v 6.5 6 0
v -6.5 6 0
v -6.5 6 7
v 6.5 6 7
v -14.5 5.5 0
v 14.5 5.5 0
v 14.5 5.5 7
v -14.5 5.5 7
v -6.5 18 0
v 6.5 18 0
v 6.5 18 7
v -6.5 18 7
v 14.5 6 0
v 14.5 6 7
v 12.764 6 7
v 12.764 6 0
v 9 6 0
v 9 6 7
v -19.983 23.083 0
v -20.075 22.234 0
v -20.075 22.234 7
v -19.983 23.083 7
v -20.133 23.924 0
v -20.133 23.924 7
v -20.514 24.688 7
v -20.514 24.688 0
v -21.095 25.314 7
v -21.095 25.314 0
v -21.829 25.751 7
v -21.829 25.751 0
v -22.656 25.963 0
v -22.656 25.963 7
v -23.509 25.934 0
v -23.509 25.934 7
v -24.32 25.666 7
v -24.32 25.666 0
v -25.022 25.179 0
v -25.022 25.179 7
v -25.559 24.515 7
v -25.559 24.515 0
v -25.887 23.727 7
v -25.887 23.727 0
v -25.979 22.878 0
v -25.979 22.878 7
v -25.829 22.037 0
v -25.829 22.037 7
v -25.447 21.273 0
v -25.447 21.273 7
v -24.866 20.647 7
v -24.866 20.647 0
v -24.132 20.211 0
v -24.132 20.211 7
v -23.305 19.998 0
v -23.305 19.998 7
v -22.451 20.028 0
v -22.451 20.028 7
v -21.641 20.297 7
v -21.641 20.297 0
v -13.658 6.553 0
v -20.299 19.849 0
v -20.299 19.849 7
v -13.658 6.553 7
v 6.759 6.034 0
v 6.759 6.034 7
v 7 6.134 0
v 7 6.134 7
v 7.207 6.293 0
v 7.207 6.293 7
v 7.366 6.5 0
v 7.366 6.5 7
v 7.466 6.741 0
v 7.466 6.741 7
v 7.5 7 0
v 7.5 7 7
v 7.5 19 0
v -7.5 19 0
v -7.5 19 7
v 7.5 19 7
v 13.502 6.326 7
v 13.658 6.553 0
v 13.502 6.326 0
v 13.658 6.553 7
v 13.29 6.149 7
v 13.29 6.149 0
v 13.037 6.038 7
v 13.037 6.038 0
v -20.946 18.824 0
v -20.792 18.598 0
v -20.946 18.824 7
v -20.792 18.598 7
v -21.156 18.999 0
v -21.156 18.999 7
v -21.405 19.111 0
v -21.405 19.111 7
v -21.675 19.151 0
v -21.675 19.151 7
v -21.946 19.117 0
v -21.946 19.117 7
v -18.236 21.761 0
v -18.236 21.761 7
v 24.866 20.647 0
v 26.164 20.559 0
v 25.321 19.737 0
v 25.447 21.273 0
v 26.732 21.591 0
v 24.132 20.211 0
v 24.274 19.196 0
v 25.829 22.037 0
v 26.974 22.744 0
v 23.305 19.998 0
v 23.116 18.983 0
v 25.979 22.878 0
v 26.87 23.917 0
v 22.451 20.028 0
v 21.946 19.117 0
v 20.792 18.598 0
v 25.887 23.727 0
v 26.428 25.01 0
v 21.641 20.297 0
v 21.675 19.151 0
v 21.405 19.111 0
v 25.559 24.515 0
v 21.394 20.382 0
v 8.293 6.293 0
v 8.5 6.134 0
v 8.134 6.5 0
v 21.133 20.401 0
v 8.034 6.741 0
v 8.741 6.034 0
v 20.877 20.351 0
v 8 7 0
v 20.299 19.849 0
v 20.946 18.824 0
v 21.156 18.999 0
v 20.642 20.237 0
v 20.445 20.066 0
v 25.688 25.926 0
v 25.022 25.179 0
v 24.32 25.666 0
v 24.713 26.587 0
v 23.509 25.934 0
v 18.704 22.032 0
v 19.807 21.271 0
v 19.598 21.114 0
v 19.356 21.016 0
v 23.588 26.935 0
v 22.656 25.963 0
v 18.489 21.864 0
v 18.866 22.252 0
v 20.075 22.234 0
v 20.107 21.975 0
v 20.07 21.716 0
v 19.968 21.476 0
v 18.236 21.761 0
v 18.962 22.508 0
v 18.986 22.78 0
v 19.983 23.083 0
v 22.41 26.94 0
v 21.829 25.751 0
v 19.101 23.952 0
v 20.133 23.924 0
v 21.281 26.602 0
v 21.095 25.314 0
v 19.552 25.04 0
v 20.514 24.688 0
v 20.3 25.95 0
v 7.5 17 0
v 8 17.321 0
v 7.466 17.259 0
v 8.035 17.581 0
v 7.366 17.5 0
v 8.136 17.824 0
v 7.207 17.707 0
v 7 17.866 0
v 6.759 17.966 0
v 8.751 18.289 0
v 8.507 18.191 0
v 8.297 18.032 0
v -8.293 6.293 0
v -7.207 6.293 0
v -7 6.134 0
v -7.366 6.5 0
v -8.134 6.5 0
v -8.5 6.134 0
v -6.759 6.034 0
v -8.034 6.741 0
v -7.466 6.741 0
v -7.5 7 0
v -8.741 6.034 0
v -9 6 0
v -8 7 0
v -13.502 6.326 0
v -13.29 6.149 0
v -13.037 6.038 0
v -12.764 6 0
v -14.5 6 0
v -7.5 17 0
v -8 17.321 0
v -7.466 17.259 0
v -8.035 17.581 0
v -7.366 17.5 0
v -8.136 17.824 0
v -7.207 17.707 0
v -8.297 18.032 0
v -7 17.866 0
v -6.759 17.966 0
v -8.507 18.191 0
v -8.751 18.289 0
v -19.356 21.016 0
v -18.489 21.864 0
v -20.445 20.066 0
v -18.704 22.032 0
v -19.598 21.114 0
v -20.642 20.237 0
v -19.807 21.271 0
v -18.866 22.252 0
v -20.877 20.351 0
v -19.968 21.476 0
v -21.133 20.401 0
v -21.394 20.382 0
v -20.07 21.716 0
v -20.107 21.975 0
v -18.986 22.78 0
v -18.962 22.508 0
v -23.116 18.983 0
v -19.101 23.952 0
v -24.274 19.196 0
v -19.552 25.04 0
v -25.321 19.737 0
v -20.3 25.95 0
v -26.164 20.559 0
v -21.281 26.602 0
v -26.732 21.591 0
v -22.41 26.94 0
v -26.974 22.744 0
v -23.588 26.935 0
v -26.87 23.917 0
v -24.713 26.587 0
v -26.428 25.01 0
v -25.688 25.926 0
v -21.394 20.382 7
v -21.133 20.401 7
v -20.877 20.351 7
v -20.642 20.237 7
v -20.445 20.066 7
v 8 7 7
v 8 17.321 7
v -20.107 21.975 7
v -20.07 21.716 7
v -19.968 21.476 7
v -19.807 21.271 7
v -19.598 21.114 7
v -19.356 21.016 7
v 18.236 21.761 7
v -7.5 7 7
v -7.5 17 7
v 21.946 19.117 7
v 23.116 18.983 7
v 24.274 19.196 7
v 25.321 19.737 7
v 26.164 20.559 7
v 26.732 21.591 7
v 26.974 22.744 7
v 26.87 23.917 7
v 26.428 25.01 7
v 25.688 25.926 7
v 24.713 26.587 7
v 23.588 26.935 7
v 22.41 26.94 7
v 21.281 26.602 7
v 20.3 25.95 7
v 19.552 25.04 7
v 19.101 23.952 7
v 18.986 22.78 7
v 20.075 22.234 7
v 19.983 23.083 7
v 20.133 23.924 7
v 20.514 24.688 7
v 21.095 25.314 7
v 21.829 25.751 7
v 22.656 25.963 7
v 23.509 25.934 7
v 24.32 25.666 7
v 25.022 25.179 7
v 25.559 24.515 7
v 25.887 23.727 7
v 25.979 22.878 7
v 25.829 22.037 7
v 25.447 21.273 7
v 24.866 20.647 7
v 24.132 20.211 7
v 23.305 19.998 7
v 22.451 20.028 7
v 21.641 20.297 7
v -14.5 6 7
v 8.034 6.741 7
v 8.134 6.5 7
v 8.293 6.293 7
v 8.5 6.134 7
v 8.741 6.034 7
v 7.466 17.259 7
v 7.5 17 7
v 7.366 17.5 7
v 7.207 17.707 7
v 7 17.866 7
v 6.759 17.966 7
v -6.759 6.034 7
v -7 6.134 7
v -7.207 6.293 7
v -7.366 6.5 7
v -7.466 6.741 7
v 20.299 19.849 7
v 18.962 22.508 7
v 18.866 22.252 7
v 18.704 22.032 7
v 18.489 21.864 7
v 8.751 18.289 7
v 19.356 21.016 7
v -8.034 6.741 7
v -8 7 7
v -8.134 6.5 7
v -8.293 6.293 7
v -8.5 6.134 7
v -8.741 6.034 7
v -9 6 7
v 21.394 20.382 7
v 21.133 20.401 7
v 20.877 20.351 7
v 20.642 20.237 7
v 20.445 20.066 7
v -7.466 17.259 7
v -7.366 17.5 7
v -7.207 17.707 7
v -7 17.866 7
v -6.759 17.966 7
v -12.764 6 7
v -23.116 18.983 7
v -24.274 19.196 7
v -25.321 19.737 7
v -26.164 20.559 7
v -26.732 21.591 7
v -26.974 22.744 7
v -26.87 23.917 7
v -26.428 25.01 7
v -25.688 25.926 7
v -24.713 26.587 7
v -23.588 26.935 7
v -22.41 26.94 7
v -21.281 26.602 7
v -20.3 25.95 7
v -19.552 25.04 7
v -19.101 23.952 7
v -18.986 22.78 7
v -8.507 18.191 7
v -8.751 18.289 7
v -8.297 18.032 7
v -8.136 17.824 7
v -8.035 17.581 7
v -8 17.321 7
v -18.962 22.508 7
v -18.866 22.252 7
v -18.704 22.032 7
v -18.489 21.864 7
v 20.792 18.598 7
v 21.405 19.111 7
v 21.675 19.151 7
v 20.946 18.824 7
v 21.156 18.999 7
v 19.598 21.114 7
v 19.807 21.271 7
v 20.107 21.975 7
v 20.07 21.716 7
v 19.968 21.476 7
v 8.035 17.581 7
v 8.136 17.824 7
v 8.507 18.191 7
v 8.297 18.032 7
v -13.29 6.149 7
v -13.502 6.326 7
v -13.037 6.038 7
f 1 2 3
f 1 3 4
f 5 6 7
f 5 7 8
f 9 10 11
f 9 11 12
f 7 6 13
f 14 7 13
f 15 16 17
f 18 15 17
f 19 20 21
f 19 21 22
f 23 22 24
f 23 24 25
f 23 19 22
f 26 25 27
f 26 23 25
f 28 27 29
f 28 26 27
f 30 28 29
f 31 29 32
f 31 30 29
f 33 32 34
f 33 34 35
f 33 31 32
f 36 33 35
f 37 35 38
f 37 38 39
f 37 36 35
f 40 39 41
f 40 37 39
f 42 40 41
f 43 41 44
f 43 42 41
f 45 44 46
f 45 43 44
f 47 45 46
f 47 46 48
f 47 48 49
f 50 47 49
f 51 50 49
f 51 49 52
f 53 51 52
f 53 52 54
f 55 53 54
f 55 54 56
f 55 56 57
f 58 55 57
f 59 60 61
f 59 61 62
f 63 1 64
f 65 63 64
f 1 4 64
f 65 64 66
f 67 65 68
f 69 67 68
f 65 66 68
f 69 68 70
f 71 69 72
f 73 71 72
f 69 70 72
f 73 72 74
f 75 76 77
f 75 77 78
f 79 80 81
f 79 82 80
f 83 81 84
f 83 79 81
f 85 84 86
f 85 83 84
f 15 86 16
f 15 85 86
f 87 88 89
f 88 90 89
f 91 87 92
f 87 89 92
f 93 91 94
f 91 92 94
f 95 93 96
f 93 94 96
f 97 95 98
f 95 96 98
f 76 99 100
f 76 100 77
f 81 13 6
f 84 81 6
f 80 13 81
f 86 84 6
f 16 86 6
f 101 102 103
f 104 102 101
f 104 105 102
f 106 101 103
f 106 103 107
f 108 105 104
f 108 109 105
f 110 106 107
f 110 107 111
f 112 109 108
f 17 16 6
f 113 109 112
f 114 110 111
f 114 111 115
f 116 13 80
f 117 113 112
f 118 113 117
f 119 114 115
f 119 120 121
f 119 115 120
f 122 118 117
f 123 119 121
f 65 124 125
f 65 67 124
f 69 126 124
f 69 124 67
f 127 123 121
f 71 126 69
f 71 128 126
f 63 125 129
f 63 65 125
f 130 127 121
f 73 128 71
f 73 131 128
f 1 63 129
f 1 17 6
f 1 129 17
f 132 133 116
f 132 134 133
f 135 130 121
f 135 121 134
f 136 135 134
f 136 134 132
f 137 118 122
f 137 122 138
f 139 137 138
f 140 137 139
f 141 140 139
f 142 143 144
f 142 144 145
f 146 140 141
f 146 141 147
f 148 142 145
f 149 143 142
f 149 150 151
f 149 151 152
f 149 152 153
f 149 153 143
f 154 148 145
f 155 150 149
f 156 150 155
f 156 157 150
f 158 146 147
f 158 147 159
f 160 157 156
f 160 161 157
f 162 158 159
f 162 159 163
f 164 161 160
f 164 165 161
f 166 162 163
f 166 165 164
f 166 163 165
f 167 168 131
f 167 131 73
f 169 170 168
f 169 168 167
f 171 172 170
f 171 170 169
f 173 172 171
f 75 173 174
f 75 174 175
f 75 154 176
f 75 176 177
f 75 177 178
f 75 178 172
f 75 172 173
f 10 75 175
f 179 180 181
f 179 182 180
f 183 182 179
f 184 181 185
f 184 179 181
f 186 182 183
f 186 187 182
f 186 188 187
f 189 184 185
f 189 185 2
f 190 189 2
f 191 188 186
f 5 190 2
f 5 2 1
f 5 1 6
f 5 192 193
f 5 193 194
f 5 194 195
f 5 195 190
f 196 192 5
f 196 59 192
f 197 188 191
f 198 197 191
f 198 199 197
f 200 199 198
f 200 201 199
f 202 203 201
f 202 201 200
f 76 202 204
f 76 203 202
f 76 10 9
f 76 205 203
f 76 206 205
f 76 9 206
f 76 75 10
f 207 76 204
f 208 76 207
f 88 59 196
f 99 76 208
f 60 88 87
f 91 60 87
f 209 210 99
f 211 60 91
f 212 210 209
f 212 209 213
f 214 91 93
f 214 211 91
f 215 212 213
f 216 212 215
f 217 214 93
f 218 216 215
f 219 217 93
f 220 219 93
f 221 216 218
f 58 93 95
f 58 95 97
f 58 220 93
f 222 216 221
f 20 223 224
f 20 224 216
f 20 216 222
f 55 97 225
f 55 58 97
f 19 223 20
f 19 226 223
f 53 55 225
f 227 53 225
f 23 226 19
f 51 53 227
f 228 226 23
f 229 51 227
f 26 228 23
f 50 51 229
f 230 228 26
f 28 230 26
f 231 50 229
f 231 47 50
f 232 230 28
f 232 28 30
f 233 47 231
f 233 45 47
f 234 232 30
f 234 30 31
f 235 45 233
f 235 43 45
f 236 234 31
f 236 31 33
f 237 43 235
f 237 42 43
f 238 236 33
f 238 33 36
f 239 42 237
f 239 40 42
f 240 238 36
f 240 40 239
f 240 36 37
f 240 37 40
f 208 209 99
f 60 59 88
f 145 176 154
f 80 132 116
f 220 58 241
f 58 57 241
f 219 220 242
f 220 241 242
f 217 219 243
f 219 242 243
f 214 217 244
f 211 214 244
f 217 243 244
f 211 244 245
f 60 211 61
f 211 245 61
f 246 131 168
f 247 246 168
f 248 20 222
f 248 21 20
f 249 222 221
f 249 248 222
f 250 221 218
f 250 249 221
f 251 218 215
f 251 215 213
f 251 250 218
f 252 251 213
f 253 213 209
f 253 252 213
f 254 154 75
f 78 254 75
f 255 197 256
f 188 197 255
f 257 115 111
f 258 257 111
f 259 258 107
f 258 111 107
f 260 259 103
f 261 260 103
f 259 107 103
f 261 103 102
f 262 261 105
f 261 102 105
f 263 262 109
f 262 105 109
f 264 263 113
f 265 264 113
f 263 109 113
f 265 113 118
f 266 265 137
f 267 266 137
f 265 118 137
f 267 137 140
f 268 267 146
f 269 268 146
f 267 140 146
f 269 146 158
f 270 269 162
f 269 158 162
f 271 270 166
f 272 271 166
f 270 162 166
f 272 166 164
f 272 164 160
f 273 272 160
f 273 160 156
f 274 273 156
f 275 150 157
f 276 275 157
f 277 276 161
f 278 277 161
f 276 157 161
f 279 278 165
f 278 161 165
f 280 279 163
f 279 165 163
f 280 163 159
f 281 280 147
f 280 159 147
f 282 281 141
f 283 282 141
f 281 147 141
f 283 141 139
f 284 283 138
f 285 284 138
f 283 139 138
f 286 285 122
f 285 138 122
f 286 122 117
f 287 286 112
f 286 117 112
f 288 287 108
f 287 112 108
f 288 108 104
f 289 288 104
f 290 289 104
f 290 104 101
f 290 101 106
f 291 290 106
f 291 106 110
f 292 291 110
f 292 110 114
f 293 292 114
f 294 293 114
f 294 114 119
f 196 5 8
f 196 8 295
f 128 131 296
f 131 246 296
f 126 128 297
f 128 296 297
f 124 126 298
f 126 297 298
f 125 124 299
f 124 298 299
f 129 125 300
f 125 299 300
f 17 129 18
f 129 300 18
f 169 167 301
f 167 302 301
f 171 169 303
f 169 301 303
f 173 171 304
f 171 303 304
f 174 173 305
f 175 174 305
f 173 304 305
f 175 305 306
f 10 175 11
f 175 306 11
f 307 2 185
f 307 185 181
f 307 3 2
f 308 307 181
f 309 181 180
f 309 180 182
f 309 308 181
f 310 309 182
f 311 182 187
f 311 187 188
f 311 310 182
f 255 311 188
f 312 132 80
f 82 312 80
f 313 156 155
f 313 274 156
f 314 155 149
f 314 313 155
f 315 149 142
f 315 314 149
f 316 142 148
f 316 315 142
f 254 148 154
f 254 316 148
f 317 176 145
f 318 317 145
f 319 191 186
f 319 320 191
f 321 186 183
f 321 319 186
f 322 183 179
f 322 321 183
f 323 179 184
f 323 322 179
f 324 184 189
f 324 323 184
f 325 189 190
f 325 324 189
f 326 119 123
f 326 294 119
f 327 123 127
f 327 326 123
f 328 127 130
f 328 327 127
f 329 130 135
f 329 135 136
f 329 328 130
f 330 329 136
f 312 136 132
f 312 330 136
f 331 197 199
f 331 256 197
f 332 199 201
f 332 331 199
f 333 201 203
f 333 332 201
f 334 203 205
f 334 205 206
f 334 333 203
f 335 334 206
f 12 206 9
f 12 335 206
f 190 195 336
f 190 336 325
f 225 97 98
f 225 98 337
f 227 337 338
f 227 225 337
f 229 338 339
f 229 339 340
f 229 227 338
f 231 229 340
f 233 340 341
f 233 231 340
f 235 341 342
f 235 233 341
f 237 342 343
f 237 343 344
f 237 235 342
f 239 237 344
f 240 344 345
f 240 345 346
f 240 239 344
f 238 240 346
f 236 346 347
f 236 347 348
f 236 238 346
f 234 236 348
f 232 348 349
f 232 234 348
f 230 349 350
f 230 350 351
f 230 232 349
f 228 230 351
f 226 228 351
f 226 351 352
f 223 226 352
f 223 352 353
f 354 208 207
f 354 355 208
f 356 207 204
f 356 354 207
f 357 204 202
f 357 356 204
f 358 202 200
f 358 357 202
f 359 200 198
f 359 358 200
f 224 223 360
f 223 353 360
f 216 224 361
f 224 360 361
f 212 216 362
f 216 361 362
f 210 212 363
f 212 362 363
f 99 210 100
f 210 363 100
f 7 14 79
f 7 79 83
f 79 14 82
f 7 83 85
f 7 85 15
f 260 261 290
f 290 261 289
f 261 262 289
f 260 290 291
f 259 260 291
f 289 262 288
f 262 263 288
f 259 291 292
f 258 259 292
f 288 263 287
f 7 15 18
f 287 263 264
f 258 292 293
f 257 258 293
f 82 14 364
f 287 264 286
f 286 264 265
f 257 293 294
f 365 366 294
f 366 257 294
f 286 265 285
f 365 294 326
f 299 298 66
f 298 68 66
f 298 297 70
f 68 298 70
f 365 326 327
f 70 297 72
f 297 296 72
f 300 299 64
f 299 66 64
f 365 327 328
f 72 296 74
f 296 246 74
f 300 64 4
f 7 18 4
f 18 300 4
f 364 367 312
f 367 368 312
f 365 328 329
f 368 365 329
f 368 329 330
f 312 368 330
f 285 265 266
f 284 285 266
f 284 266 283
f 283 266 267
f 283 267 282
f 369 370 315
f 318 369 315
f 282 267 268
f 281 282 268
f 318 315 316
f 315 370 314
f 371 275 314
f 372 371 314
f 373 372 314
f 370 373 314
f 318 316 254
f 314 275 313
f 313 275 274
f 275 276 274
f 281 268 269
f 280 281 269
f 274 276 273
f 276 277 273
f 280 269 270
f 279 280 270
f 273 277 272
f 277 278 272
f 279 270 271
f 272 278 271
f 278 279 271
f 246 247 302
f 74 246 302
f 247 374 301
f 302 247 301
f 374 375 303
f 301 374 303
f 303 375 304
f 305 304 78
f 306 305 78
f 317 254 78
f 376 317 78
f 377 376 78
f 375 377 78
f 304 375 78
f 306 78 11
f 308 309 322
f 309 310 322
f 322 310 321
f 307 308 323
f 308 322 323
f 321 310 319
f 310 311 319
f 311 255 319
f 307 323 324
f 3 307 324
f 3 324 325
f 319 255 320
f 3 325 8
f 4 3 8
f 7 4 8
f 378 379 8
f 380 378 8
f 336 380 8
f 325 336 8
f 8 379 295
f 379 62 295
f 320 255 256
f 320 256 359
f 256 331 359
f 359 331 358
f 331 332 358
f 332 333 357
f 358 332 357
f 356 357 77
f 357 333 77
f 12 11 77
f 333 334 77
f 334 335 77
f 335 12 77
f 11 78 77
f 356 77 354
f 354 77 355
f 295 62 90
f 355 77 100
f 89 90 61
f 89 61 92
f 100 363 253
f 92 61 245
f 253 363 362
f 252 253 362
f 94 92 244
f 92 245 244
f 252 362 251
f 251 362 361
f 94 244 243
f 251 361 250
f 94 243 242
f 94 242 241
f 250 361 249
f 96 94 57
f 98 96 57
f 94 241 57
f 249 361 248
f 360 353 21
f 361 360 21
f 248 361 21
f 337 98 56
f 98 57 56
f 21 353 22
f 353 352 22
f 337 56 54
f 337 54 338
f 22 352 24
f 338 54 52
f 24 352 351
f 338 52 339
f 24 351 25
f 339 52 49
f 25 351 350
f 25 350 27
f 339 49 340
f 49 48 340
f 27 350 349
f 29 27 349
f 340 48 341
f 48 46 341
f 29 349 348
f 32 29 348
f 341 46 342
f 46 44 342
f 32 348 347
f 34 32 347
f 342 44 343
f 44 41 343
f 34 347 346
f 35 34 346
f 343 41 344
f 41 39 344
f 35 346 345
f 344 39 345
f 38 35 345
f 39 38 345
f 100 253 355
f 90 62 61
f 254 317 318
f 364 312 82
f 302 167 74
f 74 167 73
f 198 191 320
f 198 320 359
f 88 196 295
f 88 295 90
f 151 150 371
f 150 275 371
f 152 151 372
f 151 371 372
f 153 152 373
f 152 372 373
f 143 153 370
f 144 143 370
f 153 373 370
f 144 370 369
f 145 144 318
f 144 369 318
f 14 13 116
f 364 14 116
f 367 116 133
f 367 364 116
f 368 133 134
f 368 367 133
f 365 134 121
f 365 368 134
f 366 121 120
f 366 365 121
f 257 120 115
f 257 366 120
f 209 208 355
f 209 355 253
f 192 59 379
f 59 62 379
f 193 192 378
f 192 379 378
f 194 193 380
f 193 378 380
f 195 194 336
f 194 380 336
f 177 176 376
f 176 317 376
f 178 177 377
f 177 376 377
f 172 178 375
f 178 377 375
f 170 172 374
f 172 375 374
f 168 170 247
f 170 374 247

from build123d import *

# Parameters (mm, degrees)
F1_DEPTH = 7
F2_R     = 1
F3_R     = 1


with BuildPart() as f1:
    # F0 (on Top) → F1 (new body)
    with BuildSketch(Plane.XY):
        with BuildLine():
            ThreePointArc((20.490715, 21.30806), (25.314352, 24.866528), (20.822566, 20.897394))
            Line((20.822566, 20.897394), (13.382216, 6))
            Line((13.382216, 6), (14.5, 6))
            Line((14.5, 6), (21.19372, 19.40246))
            ThreePointArc((21.19372, 19.40246), (26.092146, 25.495048), (19.107008, 21.984771))
            Line((19.107008, 21.984771), (7.5, 19))
            Line((7.5, 19), (0, 19))
            Line((0, 19), (0, 18))
            Line((0, 18), (7.5, 18))
            Line((7.5, 18), (7.626518, 18))
            Line((7.626518, 18), (8, 18.096042))
            Line((8, 18.096042), (20.490715, 21.30806))
        make_face()
        Polygon((14.5, 6), (13.382216, 6), (8, 6), (7.5, 6), (0, 6), (0, 5.5), (14.5, 5.5), align=None)
        Polygon((8, 6), (8, 18.096042), (7.626518, 18), (7.5, 18), (7.5, 6), align=None)
    extrude(amount=F1_DEPTH)

    # F2
    f2_edges = [f1.edges().sort_by_distance(p)[0] for p in [
        (21.19372, 19.40246, 3.5),
        (20.822566, 20.897394, 3.5),
        (20.490715, 21.30806, 3.5),
        (19.107008, 21.984771, 3.5),
    ]]
    fillet(f2_edges, radius=F2_R)

    # F3
    f3_edges = [f1.edges().sort_by_distance(p)[0] for p in [
        (8, 18.096042, 3.5),
        (13.382216, 6, 3.5),
        (8, 6, 3.5),
        (7.5, 18, 3.5),
        (7.5, 6, 3.5),
    ]]
    fillet(f3_edges, radius=F3_R)

    # F4: F1 across plane


with BuildPart() as f1_1:
    add(f1.part)
    add(f1.part.mirror(Plane.YZ))


solid = f1_1.part
